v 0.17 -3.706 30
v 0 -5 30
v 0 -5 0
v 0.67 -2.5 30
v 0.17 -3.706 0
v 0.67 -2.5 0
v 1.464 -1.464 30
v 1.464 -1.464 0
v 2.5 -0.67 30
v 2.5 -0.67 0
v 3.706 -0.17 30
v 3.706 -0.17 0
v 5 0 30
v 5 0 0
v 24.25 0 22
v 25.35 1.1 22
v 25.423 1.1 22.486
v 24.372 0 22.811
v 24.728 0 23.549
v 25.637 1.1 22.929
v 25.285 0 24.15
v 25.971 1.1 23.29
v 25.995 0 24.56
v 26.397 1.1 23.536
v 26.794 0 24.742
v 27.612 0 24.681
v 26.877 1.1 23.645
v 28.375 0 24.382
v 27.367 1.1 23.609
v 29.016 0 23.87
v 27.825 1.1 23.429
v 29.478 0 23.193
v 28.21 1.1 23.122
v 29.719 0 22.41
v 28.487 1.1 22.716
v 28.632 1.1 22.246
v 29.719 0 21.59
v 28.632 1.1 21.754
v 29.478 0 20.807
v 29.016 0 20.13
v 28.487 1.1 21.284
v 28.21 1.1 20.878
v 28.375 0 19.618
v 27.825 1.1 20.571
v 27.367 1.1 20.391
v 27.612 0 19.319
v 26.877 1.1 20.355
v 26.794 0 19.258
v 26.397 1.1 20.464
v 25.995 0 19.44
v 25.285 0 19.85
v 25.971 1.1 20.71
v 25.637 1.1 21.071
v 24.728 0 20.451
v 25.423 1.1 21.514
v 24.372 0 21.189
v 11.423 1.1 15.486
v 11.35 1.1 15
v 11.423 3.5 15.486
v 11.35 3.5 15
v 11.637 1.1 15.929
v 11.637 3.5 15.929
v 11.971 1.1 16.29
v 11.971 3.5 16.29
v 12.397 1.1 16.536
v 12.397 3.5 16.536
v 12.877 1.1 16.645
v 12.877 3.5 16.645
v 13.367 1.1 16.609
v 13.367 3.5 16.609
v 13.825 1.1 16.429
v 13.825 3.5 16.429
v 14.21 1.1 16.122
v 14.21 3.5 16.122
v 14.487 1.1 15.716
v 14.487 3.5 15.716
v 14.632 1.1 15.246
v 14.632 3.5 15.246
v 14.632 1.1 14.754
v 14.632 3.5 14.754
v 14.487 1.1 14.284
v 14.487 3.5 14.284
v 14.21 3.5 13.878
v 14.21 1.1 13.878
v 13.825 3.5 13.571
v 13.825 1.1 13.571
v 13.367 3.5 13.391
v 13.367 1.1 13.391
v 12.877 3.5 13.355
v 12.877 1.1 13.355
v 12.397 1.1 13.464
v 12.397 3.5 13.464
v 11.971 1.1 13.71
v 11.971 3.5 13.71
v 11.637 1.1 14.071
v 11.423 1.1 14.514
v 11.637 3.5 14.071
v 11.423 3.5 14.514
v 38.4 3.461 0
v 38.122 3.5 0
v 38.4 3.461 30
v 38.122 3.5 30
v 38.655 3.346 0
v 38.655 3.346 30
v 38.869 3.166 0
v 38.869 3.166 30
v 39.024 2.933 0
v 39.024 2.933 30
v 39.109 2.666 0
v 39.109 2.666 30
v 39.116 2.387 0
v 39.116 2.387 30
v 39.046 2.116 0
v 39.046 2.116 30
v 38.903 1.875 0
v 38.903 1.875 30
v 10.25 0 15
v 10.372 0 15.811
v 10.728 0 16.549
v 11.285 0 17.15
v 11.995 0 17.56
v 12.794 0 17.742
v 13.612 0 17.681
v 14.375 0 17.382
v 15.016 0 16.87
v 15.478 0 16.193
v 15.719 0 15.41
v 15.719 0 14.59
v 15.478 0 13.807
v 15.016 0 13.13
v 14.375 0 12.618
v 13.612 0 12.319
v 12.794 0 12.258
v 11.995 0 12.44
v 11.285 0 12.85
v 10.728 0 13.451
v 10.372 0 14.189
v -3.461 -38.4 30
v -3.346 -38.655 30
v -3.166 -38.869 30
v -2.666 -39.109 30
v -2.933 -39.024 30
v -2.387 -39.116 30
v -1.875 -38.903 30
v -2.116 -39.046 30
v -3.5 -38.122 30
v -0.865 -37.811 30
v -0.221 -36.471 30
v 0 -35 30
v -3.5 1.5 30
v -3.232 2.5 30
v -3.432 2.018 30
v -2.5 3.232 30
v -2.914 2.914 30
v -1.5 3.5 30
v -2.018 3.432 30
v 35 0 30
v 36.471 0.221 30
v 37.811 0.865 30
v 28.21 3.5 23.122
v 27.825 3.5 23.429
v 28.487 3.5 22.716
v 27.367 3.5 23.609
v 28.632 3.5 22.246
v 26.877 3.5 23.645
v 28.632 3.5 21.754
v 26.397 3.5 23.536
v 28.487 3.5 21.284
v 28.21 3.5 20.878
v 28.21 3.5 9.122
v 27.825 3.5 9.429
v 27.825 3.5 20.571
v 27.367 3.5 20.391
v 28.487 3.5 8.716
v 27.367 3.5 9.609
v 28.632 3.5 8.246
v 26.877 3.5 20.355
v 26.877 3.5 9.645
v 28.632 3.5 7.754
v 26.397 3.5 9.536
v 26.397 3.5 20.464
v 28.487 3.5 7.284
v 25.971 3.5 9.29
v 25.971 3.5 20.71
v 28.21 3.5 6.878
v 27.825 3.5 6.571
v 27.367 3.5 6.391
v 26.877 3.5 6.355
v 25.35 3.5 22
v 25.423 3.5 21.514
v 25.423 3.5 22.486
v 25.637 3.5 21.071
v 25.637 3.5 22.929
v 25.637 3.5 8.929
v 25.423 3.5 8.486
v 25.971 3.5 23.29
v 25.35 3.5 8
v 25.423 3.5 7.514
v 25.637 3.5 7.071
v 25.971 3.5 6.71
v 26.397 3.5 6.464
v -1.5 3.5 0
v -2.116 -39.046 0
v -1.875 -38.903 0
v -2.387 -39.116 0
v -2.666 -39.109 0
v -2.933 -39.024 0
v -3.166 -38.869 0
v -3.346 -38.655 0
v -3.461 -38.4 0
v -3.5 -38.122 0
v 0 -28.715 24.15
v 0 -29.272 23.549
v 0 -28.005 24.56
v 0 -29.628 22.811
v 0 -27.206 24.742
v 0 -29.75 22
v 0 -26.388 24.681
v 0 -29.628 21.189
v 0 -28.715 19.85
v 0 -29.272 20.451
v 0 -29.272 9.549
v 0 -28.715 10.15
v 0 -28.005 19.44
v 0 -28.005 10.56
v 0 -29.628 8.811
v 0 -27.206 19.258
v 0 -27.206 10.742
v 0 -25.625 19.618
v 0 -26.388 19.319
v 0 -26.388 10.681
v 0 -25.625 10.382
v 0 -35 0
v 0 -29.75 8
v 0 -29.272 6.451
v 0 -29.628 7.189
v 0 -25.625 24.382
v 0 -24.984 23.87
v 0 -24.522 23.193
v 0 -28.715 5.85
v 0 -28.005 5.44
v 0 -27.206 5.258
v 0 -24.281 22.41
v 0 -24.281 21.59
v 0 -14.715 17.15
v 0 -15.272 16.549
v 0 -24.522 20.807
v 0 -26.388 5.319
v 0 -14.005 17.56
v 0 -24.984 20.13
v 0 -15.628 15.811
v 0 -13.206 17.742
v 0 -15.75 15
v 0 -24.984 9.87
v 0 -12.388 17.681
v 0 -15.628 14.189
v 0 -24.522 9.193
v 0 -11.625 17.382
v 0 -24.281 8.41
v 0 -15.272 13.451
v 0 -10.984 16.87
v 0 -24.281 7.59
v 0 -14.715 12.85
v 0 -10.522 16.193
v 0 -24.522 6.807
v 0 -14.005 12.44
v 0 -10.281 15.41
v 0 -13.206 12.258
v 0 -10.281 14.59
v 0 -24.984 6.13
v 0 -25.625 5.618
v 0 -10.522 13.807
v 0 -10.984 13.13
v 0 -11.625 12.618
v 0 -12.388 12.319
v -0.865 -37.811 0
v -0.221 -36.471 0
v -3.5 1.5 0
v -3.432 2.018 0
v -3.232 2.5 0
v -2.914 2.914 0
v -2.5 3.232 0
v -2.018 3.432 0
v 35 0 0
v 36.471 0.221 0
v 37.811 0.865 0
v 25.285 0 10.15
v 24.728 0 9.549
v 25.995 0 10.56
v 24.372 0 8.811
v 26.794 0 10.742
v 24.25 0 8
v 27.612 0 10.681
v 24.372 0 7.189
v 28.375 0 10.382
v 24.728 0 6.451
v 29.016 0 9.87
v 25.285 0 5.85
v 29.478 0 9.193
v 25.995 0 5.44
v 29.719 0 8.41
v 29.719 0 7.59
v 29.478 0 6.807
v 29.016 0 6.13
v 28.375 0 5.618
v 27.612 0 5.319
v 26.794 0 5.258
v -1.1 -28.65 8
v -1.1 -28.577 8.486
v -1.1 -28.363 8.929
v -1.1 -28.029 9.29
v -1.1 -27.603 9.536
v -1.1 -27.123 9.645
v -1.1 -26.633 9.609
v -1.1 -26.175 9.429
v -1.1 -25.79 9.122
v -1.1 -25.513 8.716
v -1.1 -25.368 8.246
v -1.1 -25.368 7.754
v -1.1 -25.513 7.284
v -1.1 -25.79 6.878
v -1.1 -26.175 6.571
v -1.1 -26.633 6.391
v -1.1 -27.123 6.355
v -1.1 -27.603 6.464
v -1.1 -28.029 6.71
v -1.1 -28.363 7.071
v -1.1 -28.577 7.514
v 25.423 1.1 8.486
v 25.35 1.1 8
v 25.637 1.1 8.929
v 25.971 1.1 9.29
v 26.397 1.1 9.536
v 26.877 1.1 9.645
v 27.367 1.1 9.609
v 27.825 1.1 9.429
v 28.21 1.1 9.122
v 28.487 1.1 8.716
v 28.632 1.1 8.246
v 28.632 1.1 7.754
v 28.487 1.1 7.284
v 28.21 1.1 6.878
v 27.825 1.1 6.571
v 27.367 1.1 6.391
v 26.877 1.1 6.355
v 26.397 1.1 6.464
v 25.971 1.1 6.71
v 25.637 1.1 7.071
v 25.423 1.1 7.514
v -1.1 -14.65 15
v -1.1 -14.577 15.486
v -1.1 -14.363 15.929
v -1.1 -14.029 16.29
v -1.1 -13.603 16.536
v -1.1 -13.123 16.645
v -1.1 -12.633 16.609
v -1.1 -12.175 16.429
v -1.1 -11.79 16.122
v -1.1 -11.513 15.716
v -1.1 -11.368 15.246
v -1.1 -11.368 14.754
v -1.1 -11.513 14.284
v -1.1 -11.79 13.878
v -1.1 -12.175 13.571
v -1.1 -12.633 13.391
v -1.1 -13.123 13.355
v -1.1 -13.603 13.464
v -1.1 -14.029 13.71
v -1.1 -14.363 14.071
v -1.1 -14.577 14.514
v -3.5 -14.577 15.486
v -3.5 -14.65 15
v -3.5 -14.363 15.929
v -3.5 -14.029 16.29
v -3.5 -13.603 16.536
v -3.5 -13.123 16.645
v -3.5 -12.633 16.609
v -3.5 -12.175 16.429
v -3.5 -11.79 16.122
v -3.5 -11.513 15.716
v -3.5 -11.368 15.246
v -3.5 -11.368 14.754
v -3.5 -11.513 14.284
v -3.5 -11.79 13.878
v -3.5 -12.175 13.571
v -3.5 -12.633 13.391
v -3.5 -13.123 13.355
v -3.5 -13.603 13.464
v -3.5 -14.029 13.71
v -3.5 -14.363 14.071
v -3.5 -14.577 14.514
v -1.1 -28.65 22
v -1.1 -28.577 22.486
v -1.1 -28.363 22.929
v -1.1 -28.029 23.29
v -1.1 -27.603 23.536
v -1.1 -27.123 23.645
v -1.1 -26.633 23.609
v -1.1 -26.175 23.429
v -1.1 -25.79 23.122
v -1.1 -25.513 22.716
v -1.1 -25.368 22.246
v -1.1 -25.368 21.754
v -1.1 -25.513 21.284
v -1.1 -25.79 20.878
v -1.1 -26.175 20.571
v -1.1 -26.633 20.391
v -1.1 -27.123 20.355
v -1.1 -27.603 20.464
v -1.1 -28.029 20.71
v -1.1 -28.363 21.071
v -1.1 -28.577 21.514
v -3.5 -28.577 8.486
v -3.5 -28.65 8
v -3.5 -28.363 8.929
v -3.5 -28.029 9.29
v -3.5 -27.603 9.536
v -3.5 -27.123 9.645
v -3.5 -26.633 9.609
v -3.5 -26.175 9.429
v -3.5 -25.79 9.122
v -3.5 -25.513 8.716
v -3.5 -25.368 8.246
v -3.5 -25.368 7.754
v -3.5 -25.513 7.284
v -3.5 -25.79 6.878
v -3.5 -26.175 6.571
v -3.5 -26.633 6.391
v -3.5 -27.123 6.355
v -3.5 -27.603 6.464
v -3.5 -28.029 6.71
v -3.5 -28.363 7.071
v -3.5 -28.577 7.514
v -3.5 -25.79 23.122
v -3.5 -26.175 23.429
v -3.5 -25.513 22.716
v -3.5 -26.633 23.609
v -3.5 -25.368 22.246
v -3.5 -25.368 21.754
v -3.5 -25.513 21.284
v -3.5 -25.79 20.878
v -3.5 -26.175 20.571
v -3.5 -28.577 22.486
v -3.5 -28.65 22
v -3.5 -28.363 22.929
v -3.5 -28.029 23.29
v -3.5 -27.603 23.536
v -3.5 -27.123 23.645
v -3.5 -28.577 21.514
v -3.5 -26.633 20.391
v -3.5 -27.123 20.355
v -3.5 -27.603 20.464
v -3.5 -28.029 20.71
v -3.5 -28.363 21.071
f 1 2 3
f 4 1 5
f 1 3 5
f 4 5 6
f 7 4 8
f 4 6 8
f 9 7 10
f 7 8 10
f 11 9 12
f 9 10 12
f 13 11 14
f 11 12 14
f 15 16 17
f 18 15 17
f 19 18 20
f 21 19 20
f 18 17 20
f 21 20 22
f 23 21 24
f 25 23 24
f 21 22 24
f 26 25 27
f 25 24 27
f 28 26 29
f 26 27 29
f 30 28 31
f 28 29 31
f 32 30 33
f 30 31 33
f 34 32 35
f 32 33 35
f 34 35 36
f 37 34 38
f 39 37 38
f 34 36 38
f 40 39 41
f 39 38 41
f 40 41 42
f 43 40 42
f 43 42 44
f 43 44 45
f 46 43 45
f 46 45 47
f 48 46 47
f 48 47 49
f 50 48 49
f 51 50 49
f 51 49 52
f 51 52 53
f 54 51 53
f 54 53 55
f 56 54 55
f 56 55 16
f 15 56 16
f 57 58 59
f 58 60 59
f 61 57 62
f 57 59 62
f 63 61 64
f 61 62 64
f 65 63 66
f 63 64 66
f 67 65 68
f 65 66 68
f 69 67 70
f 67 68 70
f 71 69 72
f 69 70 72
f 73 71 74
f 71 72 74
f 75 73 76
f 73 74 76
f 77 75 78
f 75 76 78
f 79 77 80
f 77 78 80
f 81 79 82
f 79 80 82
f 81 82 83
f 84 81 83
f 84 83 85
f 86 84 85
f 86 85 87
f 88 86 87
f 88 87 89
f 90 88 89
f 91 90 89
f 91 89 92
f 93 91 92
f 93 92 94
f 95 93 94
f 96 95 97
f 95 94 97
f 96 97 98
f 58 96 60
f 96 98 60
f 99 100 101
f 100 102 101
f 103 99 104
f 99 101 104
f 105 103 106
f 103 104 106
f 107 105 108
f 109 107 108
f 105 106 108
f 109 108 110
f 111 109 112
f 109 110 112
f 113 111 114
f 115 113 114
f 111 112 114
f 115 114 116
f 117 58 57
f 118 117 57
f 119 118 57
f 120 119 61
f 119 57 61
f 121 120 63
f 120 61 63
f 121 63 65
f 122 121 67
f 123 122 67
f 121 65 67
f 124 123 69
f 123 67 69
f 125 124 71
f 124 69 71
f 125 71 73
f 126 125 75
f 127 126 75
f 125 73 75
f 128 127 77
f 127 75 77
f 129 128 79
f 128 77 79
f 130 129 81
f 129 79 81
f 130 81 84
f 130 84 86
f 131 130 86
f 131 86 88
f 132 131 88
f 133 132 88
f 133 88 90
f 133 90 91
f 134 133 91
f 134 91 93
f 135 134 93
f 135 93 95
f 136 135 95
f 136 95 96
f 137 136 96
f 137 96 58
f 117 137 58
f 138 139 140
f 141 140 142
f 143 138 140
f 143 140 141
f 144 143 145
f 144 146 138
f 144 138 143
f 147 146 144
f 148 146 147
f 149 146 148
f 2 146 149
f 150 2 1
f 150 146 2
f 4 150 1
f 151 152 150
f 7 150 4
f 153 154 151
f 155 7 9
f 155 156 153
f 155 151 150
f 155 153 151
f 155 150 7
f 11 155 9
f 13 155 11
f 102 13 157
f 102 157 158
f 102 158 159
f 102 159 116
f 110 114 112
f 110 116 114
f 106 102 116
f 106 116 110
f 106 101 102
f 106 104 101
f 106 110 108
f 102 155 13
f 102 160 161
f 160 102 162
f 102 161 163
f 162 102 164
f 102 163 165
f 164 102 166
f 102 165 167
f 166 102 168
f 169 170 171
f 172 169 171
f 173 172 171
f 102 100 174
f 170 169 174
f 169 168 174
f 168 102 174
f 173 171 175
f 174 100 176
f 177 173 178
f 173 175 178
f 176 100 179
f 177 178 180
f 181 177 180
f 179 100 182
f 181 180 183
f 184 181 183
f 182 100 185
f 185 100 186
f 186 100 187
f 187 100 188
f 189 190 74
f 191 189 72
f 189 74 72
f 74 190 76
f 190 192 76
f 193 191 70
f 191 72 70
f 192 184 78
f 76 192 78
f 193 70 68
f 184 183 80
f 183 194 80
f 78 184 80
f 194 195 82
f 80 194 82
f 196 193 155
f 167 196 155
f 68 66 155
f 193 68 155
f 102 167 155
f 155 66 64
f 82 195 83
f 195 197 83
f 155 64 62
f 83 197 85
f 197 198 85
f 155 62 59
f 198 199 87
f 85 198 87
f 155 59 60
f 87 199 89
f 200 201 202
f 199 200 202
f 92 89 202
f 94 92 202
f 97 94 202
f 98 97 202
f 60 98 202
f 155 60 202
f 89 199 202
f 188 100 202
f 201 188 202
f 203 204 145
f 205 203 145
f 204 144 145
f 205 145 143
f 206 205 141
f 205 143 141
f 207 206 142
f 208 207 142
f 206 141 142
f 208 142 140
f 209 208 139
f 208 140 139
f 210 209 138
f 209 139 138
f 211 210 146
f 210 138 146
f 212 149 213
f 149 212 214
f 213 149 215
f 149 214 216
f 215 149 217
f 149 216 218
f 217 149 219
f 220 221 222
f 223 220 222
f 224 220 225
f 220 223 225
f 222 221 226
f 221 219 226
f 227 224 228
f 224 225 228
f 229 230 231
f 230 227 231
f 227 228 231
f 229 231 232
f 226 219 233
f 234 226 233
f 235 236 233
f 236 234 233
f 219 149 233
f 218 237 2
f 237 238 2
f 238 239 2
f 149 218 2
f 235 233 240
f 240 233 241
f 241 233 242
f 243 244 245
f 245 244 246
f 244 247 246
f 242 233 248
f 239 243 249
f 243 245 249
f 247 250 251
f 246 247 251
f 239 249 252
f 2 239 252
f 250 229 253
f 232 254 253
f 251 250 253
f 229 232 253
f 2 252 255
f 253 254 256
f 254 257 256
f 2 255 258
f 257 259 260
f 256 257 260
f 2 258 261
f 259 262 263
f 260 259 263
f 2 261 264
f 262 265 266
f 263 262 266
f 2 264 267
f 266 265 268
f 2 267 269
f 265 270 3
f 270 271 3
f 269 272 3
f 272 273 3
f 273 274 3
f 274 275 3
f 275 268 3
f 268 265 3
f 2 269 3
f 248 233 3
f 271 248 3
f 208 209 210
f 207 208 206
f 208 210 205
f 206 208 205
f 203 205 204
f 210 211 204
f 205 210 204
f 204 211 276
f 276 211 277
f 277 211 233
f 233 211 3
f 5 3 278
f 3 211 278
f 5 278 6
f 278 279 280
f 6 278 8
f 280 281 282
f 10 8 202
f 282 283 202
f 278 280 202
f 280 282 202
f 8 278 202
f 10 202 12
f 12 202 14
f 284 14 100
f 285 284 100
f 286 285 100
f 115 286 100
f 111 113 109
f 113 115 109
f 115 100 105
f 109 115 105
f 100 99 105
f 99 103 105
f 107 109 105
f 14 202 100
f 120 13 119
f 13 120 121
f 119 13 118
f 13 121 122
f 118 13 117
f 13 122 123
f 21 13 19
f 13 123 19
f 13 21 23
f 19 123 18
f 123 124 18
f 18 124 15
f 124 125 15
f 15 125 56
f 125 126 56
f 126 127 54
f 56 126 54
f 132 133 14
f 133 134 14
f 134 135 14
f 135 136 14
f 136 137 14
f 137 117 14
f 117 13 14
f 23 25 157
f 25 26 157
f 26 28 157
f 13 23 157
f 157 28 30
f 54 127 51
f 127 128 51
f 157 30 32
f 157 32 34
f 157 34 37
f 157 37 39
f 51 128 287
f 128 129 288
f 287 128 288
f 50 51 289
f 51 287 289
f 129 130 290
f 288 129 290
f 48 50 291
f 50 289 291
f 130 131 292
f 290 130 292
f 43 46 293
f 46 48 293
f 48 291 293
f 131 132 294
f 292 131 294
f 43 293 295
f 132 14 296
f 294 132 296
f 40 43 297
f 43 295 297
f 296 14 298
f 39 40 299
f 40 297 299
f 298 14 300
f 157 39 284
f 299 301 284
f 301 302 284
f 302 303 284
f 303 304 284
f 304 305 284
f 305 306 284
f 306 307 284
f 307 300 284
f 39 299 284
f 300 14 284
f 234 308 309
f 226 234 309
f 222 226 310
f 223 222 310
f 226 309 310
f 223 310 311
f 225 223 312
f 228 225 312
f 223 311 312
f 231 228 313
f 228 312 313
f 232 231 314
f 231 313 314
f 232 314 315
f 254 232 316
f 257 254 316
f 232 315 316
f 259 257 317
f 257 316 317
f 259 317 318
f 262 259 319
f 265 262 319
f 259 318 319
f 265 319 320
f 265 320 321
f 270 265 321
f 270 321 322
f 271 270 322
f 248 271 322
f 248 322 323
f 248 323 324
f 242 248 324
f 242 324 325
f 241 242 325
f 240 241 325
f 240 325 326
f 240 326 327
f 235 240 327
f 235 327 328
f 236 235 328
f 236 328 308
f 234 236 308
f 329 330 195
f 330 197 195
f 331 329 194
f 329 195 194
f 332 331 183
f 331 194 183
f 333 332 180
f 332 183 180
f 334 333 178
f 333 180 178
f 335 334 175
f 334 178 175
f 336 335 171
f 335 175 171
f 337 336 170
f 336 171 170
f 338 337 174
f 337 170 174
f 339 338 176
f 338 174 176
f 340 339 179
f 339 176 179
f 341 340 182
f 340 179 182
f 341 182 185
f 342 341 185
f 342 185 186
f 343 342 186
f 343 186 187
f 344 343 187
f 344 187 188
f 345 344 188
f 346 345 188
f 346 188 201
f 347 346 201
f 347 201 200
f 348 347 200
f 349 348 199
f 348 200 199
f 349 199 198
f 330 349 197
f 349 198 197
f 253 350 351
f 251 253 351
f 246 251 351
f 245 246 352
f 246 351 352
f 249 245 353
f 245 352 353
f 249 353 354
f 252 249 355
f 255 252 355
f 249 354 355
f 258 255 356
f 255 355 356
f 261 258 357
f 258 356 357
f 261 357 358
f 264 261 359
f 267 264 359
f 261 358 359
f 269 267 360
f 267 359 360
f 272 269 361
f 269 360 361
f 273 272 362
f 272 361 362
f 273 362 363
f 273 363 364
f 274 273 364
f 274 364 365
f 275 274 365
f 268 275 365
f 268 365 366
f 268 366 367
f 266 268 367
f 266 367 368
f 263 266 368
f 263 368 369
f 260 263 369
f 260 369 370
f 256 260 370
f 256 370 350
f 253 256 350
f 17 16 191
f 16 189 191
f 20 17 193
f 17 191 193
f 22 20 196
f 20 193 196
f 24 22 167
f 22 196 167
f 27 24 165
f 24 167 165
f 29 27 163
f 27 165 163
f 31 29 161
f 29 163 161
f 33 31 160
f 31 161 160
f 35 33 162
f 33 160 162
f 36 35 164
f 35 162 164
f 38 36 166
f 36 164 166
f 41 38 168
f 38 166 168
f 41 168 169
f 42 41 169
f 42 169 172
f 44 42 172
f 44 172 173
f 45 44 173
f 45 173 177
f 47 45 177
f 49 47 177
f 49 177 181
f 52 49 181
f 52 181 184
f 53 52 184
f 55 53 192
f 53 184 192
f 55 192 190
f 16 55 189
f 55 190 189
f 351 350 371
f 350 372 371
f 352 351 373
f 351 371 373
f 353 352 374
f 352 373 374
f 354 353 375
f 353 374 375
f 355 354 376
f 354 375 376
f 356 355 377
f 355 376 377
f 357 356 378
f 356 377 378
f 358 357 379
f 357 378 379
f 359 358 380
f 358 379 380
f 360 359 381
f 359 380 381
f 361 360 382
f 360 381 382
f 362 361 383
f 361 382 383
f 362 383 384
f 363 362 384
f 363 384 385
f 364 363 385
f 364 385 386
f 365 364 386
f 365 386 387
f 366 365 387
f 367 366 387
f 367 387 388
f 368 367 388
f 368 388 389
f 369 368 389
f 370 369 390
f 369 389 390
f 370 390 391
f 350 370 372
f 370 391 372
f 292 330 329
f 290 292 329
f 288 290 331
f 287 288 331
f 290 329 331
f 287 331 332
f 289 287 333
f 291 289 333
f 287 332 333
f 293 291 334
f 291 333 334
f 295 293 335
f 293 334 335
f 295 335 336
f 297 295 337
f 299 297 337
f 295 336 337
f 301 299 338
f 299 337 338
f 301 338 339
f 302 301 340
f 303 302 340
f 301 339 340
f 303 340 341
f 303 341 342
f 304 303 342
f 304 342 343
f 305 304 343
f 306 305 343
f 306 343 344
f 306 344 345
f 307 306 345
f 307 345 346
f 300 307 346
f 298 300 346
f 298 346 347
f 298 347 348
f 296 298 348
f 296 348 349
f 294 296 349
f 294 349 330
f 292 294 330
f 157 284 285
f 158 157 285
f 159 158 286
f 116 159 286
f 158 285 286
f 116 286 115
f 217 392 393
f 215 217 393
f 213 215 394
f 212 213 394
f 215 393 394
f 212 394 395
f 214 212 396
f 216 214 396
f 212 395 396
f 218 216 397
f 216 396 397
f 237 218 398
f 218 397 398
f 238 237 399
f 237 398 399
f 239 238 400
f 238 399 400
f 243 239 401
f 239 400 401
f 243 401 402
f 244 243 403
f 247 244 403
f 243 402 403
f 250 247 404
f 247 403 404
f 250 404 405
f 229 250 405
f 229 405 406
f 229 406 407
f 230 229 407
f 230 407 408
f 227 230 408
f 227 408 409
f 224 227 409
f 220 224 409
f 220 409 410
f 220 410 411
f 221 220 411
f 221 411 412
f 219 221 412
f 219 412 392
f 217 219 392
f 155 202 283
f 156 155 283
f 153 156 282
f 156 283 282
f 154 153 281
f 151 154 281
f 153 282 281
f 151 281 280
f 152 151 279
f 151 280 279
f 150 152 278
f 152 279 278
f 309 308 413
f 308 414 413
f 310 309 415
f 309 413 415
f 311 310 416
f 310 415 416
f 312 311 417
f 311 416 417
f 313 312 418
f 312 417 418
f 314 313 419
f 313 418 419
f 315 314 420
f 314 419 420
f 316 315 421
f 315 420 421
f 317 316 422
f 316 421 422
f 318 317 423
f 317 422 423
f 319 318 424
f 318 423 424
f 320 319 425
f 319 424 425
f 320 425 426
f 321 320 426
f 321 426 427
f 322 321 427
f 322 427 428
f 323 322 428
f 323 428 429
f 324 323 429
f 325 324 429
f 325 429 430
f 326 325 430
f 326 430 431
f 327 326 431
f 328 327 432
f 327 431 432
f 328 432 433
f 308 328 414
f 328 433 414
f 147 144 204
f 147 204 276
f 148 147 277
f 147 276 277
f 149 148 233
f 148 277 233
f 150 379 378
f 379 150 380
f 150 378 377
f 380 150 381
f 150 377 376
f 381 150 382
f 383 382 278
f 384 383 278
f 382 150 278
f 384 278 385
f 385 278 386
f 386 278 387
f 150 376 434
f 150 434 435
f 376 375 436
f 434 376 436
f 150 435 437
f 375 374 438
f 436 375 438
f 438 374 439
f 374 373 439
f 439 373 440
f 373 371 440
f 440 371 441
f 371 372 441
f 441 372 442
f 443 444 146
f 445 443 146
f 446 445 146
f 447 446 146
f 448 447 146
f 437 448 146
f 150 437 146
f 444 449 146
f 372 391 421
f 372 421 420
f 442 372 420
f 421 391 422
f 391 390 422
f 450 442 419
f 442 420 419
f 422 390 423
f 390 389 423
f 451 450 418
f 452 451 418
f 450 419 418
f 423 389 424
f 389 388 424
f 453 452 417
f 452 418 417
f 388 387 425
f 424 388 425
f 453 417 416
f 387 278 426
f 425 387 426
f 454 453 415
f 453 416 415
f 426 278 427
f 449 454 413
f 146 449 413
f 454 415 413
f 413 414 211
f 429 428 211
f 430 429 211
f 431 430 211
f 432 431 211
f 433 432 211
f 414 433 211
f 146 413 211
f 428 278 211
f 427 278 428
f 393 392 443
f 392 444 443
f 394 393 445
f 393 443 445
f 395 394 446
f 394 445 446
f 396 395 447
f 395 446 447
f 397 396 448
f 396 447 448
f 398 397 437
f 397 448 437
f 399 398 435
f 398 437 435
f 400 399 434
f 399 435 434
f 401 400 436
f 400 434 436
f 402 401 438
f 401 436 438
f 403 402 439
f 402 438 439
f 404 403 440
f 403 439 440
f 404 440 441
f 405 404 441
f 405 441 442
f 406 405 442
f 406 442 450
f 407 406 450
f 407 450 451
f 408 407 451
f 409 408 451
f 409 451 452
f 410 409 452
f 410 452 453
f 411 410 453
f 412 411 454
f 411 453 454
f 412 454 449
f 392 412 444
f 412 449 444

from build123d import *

# Parameters (mm, degrees)
F1_DEPTH             = 30
F4_D                 = 3.3
F4_CSINK_D           = 5.5
F4_CSINK_ANGLE       = 90
F4_ON_F3_D           = 3.3
F4_ON_F3_CSINK_D     = 5.5
F4_ON_F3_CSINK_ANGLE = 90
F5_R                 = 1


with BuildPart() as f1:
    # F0 (on Top) → F1 (new body)
    with BuildSketch(Plane.XY):
        with BuildLine():
            ThreePointArc((-3.5, -39.7696960071), (-0.9688711259, -37.9580398915), (0, -35))
            Line((0, -35), (0, -5))
            ThreePointArc((0, -5), (1.4644660941, -1.4644660941), (5, 0))
            Line((5, 0), (35, 0))
            ThreePointArc((35, 0), (37.9580398915, 0.9688711259), (39.7696960071, 3.5))
            Line((39.7696960071, 3.5), (-1.5, 3.5))
            ThreePointArc((-1.5, 3.5), (-2.9142135624, 2.9142135624), (-3.5, 1.5))
            Line((-3.5, 1.5), (-3.5, -39.7696960071))
        make_face()
    extrude(amount=F1_DEPTH)

    # F4 (through all)
    with Locations(Plane.XZ):
        with Locations((13, 15), (27, 22), (27, 8)):
            CounterSinkHole(F4_D / 2, F4_CSINK_D / 2, counter_sink_angle=F4_CSINK_ANGLE)

    # F4 on F3 (through all)
    with Locations(Plane.YZ):
        with Locations((-13, 15), (-27, 22), (-27, 8)):
            CounterSinkHole(F4_ON_F3_D / 2, F4_ON_F3_CSINK_D / 2, counter_sink_angle=F4_ON_F3_CSINK_ANGLE)

    # F5
    f5_edges = [f1.edges().sort_by_distance(p)[0] for p in [
        (-3.5, -39.769696, 15),
        (39.769696, 3.5, 15),
    ]]
    fillet(f5_edges, radius=F5_R)


solid = f1.part
